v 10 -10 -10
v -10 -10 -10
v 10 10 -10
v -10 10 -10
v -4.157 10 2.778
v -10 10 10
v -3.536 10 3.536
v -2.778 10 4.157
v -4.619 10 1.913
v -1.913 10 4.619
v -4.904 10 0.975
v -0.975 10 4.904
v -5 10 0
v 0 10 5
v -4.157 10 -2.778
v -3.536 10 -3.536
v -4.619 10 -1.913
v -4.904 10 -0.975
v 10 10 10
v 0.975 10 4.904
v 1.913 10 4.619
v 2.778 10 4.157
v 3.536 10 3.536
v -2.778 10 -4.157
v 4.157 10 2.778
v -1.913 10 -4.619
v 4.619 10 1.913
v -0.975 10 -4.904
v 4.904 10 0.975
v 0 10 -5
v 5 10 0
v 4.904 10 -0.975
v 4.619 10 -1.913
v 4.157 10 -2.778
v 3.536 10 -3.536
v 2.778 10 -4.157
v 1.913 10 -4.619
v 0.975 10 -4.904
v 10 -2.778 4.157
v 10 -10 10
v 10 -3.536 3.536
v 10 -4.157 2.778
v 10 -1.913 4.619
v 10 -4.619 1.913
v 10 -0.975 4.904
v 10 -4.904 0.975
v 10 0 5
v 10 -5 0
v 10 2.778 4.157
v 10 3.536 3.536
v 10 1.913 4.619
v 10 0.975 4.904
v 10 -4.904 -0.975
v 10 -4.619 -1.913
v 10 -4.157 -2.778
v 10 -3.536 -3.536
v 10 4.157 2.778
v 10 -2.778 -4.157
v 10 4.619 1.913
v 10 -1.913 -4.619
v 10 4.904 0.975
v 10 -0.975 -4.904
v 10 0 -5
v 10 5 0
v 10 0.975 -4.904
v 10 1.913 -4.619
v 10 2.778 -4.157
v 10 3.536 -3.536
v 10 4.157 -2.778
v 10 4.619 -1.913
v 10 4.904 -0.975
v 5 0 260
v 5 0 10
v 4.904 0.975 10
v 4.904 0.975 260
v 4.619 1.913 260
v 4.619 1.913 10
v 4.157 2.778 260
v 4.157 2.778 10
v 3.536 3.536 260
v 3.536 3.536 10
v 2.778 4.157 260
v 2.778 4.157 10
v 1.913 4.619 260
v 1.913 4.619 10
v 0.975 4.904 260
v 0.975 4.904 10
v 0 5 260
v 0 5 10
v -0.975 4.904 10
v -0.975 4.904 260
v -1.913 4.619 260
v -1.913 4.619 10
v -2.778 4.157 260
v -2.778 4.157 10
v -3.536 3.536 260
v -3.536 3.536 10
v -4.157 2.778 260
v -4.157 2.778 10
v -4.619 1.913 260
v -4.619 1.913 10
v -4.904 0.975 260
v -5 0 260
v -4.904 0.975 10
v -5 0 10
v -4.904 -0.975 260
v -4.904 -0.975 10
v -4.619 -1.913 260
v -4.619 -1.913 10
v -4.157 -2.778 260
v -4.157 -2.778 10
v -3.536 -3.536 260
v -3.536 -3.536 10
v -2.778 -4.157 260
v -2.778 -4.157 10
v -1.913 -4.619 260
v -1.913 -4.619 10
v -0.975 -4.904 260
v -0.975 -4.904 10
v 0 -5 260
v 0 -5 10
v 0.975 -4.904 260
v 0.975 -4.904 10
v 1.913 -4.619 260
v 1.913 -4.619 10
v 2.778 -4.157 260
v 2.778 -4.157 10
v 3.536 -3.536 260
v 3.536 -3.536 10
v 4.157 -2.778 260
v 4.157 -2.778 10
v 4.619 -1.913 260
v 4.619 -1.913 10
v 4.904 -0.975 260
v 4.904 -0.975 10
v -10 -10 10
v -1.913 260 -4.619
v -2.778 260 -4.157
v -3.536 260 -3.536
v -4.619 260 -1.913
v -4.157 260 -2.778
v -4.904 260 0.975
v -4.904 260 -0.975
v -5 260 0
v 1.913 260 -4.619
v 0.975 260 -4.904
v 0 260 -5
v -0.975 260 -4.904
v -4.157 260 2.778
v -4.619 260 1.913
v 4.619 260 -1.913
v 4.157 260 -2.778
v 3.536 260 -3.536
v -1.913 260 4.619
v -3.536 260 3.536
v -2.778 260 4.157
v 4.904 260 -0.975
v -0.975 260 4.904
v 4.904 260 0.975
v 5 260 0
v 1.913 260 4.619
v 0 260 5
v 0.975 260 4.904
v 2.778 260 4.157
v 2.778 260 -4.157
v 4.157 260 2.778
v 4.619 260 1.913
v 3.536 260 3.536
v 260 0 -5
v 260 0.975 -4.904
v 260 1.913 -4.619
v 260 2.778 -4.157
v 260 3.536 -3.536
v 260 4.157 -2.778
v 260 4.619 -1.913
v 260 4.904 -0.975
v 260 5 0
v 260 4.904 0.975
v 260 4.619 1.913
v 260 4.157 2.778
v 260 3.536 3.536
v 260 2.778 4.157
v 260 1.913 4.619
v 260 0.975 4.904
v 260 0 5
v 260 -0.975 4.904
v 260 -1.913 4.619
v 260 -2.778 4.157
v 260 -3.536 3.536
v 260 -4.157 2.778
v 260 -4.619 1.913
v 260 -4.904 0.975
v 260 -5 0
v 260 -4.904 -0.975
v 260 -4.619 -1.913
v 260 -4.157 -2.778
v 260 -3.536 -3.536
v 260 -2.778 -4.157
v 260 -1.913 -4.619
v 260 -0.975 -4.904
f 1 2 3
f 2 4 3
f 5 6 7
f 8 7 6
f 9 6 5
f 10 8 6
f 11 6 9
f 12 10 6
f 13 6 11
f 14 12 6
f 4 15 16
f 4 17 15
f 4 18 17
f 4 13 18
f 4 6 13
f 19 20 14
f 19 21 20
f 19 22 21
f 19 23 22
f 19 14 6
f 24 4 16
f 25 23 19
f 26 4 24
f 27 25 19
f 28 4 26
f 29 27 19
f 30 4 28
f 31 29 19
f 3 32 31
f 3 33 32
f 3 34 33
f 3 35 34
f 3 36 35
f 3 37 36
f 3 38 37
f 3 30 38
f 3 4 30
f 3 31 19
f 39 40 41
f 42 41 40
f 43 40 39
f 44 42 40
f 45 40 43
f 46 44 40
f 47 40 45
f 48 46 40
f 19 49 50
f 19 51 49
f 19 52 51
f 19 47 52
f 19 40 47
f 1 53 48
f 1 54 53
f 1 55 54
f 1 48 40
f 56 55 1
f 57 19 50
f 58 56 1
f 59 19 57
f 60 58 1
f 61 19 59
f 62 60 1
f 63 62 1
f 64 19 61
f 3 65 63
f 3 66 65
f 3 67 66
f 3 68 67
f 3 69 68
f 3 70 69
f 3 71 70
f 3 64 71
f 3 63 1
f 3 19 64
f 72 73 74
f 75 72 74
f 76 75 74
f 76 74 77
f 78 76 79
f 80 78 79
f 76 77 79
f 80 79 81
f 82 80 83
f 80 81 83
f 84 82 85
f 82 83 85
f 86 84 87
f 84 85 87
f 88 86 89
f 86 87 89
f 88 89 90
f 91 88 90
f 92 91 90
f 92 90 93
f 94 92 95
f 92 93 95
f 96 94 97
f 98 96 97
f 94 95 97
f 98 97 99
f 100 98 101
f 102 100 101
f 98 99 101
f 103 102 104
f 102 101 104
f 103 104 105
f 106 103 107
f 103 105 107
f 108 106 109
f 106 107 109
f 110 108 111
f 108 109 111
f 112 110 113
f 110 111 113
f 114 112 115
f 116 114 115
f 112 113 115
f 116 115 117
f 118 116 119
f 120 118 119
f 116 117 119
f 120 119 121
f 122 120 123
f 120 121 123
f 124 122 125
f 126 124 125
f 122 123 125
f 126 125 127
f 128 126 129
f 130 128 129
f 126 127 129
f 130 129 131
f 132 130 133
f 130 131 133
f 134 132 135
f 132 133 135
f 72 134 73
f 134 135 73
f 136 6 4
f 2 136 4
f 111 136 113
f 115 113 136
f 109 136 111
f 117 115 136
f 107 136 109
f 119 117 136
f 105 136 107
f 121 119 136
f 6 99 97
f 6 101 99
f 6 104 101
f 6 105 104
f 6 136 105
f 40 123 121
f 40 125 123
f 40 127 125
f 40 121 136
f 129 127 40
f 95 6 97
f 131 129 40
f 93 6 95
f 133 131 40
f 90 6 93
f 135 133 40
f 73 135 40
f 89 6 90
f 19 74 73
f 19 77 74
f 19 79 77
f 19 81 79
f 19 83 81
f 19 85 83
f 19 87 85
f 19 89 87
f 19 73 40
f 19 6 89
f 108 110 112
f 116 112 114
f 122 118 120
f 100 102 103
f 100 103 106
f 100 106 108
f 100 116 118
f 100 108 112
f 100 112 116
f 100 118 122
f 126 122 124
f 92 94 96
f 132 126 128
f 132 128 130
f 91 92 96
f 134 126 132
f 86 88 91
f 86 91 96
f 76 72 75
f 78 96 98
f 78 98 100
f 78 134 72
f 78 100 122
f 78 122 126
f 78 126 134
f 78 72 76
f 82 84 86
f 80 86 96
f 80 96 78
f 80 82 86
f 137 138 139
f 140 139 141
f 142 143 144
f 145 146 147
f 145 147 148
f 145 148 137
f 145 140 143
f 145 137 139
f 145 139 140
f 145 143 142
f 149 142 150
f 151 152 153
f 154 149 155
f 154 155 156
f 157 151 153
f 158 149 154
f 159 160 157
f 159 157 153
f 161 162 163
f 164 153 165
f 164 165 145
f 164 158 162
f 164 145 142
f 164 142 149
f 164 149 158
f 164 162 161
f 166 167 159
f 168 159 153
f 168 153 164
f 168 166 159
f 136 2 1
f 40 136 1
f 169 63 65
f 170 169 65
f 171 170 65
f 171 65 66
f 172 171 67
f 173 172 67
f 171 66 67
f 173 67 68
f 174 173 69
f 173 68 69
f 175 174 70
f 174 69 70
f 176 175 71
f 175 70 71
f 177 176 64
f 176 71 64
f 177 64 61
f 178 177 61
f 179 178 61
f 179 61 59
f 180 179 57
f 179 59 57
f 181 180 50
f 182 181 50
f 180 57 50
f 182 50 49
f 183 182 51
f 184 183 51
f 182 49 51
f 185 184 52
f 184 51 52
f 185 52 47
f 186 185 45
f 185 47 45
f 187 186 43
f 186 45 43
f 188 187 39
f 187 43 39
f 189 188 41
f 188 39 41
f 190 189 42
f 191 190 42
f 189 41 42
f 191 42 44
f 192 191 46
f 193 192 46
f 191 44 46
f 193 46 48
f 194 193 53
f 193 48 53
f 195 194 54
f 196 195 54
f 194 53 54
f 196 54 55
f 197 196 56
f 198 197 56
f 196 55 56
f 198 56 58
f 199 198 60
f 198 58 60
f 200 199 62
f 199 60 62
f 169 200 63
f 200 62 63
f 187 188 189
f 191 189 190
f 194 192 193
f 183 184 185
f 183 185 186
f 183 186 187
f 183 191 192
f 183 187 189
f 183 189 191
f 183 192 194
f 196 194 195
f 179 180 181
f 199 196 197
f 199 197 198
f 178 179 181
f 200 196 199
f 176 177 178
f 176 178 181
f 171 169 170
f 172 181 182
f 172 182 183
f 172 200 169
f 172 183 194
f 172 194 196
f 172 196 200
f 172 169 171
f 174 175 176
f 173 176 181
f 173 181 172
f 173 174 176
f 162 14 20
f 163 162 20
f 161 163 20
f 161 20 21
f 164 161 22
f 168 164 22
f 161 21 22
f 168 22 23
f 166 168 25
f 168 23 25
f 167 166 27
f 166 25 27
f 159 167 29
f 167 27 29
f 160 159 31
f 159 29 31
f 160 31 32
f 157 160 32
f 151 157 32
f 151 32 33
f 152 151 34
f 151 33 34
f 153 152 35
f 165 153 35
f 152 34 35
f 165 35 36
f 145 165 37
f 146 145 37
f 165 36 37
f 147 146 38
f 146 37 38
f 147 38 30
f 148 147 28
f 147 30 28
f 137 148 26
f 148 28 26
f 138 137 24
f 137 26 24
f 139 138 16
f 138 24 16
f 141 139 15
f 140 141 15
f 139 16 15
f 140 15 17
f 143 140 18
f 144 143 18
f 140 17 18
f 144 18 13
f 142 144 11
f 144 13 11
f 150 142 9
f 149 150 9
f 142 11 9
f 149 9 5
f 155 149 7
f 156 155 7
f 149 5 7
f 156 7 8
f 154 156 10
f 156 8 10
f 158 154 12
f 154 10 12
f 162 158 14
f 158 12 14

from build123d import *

# Parameters (mm, degrees)
SKETCH1_W           = 20
SKETCH1_H           = 20
BOSS_EXTRUDE1_DEPTH = 10
SKETCH2_R           = 5
BOSS_EXTRUDE2_DEPTH = 250
SKETCH3_R           = 5
BOSS_EXTRUDE3_DEPTH = 250
SKETCH4_R           = 5
BOSS_EXTRUDE4_DEPTH = 250


with BuildPart() as part:
    # Sketch1 → Boss-Extrude1 (new, symmetric)
    with BuildSketch(Plane(origin=(0, 0, 0), x_dir=(1, 0, 0), z_dir=(0, 1, 0))):
        Rectangle(SKETCH1_W, SKETCH1_H)
    extrude(amount=BOSS_EXTRUDE1_DEPTH, both=True)

    # Sketch2 → Boss-Extrude2 (add)
    with BuildSketch(Plane(origin=(10, 0, 0), x_dir=(0, 0, -1), z_dir=(1, 0, 0))):
        Circle(SKETCH2_R)
    extrude(amount=BOSS_EXTRUDE2_DEPTH)

    # Sketch3 → Boss-Extrude3 (add)
    with BuildSketch(Plane.XY.offset(10)):
        Circle(SKETCH3_R)
    extrude(amount=BOSS_EXTRUDE3_DEPTH)

    # Sketch4 → Boss-Extrude4 (add)
    with BuildSketch(Plane(origin=(0, 10, 0), x_dir=(1, 0, 0), z_dir=(0, 1, 0))):
        with Locations(Location((0, 0, 0), (0, 0, 270))):
            Circle(SKETCH4_R)
    extrude(amount=BOSS_EXTRUDE4_DEPTH)


solid = part.part
